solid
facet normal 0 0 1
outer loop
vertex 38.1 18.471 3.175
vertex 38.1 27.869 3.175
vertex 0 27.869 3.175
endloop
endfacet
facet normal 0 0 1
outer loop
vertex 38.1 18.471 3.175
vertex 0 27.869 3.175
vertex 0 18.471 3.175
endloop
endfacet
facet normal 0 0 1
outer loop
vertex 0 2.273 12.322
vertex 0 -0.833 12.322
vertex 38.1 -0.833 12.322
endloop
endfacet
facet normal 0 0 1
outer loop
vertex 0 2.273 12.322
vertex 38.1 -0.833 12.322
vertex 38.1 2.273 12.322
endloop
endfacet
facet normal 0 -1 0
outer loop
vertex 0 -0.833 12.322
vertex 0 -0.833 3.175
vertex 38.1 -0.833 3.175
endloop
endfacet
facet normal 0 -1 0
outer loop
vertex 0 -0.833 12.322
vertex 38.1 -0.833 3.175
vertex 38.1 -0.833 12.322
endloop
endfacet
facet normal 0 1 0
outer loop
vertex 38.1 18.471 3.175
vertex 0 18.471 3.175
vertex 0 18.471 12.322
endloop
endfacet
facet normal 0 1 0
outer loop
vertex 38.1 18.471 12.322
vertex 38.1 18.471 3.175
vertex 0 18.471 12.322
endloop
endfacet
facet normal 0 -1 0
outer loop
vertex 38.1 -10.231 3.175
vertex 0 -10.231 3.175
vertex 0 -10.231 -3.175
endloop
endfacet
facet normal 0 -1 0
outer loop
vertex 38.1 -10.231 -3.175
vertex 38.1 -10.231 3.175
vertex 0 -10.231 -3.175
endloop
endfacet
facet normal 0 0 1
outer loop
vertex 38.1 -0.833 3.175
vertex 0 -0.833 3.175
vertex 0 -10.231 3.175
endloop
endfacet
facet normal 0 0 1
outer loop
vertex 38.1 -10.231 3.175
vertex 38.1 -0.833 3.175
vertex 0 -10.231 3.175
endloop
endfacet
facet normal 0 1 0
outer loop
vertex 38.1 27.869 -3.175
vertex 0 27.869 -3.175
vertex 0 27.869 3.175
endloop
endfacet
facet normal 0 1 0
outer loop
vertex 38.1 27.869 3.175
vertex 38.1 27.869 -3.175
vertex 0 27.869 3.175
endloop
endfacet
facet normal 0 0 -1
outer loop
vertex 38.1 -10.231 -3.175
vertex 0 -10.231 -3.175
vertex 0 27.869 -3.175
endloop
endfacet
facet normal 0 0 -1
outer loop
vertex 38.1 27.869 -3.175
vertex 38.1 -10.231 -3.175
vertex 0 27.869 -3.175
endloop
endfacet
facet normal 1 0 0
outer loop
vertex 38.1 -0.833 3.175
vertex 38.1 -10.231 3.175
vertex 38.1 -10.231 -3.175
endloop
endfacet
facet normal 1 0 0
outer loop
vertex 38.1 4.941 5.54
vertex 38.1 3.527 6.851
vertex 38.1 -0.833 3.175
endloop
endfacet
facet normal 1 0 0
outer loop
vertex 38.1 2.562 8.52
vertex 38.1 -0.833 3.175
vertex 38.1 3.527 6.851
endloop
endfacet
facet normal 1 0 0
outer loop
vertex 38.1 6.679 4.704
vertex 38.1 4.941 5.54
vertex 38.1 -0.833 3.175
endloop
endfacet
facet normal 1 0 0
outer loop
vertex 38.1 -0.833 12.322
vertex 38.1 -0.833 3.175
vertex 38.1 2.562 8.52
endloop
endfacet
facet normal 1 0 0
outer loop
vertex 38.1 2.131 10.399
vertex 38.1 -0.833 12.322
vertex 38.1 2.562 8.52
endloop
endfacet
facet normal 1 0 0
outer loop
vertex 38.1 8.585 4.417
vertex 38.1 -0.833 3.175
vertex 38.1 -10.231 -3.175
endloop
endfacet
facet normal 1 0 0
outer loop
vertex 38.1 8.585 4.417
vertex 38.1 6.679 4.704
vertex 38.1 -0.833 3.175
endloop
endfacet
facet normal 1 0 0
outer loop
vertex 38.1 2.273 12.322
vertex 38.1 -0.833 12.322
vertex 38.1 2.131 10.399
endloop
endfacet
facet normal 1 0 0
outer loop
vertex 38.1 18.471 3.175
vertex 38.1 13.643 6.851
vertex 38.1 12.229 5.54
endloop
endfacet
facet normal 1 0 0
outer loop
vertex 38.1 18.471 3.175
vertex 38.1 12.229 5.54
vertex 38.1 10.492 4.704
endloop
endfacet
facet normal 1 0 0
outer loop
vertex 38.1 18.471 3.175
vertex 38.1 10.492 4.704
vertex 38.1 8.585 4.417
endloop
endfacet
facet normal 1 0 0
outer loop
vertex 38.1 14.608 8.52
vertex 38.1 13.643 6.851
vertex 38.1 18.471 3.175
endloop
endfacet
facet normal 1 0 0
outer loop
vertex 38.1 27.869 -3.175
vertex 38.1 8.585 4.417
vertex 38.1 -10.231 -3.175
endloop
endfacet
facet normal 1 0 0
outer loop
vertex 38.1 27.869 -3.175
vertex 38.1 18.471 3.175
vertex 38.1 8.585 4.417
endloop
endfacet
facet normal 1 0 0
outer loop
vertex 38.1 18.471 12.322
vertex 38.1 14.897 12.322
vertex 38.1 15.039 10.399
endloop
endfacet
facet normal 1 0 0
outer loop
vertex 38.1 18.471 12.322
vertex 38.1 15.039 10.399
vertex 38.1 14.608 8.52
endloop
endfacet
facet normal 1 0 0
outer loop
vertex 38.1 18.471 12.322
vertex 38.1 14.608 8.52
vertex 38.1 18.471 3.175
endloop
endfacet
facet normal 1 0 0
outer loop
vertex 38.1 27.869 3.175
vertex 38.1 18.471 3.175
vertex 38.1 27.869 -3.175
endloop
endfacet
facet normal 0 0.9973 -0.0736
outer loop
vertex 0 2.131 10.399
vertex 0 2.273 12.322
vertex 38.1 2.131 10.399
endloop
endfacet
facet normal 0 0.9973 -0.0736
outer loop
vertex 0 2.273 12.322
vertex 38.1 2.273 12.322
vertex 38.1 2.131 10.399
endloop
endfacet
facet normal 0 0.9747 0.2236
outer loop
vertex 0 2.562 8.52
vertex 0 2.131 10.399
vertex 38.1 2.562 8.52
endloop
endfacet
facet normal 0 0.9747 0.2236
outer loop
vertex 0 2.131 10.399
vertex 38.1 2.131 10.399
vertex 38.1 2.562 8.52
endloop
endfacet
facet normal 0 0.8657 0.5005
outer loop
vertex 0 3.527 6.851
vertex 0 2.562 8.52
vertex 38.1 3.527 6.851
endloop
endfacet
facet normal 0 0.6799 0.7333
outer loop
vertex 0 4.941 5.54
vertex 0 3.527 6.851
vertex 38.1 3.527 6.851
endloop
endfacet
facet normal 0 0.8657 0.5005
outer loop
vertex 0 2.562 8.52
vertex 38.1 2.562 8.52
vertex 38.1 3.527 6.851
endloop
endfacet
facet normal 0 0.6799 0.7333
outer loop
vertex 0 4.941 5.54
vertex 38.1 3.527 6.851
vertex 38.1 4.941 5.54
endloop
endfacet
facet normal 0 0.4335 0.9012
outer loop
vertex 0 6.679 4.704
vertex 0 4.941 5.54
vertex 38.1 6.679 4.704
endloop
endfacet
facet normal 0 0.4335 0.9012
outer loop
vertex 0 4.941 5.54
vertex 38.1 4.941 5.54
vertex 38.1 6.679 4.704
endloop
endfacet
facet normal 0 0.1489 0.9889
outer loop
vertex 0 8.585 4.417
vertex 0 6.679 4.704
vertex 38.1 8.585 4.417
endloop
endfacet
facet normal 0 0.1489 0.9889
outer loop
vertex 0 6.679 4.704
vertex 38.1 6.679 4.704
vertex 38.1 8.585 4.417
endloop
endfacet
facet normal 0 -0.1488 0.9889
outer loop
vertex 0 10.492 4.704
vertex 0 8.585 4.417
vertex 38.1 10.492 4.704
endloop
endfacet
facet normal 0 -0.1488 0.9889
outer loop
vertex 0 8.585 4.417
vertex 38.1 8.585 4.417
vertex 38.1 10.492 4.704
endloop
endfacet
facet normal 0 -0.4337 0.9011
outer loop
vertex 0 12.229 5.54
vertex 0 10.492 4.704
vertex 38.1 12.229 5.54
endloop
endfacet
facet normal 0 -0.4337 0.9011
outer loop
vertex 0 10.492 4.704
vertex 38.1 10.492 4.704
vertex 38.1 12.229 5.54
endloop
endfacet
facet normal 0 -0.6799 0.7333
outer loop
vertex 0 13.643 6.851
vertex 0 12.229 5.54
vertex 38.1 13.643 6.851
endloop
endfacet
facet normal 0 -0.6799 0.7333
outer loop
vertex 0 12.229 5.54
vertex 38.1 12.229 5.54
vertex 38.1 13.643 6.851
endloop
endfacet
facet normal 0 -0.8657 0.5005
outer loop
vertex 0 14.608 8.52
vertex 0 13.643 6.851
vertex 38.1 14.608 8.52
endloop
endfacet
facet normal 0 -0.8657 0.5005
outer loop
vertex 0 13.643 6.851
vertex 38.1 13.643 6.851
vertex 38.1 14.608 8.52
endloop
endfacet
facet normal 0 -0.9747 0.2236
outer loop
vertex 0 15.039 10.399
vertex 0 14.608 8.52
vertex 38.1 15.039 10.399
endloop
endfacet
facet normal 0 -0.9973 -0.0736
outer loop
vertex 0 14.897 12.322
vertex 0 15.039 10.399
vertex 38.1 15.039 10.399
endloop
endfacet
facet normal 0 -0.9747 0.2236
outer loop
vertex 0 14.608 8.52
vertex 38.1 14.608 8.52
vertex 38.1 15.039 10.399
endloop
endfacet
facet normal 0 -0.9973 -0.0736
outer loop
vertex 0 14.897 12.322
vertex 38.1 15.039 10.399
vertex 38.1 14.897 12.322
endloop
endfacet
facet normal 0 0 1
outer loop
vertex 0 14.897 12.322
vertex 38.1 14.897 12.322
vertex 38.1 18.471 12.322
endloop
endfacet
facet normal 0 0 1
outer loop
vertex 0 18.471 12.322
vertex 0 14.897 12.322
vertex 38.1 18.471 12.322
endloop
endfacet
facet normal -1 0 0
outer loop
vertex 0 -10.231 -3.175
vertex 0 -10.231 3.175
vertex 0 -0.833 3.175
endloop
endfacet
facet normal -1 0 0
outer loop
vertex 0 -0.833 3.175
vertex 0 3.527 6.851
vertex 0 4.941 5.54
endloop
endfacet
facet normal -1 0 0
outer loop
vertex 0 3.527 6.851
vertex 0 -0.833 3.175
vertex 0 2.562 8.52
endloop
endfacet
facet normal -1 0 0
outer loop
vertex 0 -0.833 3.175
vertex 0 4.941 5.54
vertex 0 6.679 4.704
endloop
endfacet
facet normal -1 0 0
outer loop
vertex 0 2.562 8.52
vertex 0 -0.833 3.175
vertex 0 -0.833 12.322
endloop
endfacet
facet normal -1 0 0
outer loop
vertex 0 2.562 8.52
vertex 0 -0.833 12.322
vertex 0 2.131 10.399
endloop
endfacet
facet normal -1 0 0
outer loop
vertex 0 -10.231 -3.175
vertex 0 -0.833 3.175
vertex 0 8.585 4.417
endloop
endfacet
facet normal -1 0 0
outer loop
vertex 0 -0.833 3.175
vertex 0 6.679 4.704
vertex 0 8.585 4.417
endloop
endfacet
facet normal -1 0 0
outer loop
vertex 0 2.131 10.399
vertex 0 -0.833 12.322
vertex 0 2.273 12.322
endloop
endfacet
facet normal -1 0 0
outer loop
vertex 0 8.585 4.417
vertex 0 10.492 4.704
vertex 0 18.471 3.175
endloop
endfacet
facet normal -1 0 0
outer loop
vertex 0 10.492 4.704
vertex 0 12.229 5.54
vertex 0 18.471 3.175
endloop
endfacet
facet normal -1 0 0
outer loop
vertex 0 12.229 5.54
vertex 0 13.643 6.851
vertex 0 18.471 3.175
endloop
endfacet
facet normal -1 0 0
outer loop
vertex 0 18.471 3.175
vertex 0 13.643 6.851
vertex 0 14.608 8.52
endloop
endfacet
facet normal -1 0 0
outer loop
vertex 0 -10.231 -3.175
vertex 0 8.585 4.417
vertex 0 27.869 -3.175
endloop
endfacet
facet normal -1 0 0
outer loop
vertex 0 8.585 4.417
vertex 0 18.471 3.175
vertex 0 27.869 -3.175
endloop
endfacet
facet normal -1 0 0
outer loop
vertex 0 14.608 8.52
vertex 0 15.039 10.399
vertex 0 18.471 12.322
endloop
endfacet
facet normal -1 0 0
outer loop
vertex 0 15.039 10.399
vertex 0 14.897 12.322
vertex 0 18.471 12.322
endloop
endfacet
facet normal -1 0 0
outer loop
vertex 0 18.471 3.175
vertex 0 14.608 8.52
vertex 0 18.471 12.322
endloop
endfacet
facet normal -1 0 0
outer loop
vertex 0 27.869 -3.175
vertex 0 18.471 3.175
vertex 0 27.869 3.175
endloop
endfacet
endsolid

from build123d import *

# Parameters (mm, degrees)
F0_W     = 19.304
F0_H     = 9.1468828812
F1_DEPTH = 38.1
F2_R     = 6.4726915954
F3_DEPTH = 38.1


with BuildPart() as f1:
    # F0 (on Right) → F1 (new body)
    with BuildSketch(Plane.YZ):
        with Locations((8.8194421337, 7.7484414406)):
            Rectangle(F0_W, F0_H)
        Polygon((-10.2305578663, -3.175), (27.8694421337, -3.175), (27.8694421337, 3.175), (18.4714421337, 3.175), (-0.8325578663, 3.175), (-10.2305578663, 3.175), align=None)
    extrude(amount=F1_DEPTH)

    # F2 (on face) → F3 (cut)
    with BuildSketch(Plane.YZ.offset(38.1)):
        with Locations((8.5852267221, 10.8897443861)):
            Circle(F2_R)
    extrude(amount=-F3_DEPTH, mode=Mode.SUBTRACT)


solid = f1.part
